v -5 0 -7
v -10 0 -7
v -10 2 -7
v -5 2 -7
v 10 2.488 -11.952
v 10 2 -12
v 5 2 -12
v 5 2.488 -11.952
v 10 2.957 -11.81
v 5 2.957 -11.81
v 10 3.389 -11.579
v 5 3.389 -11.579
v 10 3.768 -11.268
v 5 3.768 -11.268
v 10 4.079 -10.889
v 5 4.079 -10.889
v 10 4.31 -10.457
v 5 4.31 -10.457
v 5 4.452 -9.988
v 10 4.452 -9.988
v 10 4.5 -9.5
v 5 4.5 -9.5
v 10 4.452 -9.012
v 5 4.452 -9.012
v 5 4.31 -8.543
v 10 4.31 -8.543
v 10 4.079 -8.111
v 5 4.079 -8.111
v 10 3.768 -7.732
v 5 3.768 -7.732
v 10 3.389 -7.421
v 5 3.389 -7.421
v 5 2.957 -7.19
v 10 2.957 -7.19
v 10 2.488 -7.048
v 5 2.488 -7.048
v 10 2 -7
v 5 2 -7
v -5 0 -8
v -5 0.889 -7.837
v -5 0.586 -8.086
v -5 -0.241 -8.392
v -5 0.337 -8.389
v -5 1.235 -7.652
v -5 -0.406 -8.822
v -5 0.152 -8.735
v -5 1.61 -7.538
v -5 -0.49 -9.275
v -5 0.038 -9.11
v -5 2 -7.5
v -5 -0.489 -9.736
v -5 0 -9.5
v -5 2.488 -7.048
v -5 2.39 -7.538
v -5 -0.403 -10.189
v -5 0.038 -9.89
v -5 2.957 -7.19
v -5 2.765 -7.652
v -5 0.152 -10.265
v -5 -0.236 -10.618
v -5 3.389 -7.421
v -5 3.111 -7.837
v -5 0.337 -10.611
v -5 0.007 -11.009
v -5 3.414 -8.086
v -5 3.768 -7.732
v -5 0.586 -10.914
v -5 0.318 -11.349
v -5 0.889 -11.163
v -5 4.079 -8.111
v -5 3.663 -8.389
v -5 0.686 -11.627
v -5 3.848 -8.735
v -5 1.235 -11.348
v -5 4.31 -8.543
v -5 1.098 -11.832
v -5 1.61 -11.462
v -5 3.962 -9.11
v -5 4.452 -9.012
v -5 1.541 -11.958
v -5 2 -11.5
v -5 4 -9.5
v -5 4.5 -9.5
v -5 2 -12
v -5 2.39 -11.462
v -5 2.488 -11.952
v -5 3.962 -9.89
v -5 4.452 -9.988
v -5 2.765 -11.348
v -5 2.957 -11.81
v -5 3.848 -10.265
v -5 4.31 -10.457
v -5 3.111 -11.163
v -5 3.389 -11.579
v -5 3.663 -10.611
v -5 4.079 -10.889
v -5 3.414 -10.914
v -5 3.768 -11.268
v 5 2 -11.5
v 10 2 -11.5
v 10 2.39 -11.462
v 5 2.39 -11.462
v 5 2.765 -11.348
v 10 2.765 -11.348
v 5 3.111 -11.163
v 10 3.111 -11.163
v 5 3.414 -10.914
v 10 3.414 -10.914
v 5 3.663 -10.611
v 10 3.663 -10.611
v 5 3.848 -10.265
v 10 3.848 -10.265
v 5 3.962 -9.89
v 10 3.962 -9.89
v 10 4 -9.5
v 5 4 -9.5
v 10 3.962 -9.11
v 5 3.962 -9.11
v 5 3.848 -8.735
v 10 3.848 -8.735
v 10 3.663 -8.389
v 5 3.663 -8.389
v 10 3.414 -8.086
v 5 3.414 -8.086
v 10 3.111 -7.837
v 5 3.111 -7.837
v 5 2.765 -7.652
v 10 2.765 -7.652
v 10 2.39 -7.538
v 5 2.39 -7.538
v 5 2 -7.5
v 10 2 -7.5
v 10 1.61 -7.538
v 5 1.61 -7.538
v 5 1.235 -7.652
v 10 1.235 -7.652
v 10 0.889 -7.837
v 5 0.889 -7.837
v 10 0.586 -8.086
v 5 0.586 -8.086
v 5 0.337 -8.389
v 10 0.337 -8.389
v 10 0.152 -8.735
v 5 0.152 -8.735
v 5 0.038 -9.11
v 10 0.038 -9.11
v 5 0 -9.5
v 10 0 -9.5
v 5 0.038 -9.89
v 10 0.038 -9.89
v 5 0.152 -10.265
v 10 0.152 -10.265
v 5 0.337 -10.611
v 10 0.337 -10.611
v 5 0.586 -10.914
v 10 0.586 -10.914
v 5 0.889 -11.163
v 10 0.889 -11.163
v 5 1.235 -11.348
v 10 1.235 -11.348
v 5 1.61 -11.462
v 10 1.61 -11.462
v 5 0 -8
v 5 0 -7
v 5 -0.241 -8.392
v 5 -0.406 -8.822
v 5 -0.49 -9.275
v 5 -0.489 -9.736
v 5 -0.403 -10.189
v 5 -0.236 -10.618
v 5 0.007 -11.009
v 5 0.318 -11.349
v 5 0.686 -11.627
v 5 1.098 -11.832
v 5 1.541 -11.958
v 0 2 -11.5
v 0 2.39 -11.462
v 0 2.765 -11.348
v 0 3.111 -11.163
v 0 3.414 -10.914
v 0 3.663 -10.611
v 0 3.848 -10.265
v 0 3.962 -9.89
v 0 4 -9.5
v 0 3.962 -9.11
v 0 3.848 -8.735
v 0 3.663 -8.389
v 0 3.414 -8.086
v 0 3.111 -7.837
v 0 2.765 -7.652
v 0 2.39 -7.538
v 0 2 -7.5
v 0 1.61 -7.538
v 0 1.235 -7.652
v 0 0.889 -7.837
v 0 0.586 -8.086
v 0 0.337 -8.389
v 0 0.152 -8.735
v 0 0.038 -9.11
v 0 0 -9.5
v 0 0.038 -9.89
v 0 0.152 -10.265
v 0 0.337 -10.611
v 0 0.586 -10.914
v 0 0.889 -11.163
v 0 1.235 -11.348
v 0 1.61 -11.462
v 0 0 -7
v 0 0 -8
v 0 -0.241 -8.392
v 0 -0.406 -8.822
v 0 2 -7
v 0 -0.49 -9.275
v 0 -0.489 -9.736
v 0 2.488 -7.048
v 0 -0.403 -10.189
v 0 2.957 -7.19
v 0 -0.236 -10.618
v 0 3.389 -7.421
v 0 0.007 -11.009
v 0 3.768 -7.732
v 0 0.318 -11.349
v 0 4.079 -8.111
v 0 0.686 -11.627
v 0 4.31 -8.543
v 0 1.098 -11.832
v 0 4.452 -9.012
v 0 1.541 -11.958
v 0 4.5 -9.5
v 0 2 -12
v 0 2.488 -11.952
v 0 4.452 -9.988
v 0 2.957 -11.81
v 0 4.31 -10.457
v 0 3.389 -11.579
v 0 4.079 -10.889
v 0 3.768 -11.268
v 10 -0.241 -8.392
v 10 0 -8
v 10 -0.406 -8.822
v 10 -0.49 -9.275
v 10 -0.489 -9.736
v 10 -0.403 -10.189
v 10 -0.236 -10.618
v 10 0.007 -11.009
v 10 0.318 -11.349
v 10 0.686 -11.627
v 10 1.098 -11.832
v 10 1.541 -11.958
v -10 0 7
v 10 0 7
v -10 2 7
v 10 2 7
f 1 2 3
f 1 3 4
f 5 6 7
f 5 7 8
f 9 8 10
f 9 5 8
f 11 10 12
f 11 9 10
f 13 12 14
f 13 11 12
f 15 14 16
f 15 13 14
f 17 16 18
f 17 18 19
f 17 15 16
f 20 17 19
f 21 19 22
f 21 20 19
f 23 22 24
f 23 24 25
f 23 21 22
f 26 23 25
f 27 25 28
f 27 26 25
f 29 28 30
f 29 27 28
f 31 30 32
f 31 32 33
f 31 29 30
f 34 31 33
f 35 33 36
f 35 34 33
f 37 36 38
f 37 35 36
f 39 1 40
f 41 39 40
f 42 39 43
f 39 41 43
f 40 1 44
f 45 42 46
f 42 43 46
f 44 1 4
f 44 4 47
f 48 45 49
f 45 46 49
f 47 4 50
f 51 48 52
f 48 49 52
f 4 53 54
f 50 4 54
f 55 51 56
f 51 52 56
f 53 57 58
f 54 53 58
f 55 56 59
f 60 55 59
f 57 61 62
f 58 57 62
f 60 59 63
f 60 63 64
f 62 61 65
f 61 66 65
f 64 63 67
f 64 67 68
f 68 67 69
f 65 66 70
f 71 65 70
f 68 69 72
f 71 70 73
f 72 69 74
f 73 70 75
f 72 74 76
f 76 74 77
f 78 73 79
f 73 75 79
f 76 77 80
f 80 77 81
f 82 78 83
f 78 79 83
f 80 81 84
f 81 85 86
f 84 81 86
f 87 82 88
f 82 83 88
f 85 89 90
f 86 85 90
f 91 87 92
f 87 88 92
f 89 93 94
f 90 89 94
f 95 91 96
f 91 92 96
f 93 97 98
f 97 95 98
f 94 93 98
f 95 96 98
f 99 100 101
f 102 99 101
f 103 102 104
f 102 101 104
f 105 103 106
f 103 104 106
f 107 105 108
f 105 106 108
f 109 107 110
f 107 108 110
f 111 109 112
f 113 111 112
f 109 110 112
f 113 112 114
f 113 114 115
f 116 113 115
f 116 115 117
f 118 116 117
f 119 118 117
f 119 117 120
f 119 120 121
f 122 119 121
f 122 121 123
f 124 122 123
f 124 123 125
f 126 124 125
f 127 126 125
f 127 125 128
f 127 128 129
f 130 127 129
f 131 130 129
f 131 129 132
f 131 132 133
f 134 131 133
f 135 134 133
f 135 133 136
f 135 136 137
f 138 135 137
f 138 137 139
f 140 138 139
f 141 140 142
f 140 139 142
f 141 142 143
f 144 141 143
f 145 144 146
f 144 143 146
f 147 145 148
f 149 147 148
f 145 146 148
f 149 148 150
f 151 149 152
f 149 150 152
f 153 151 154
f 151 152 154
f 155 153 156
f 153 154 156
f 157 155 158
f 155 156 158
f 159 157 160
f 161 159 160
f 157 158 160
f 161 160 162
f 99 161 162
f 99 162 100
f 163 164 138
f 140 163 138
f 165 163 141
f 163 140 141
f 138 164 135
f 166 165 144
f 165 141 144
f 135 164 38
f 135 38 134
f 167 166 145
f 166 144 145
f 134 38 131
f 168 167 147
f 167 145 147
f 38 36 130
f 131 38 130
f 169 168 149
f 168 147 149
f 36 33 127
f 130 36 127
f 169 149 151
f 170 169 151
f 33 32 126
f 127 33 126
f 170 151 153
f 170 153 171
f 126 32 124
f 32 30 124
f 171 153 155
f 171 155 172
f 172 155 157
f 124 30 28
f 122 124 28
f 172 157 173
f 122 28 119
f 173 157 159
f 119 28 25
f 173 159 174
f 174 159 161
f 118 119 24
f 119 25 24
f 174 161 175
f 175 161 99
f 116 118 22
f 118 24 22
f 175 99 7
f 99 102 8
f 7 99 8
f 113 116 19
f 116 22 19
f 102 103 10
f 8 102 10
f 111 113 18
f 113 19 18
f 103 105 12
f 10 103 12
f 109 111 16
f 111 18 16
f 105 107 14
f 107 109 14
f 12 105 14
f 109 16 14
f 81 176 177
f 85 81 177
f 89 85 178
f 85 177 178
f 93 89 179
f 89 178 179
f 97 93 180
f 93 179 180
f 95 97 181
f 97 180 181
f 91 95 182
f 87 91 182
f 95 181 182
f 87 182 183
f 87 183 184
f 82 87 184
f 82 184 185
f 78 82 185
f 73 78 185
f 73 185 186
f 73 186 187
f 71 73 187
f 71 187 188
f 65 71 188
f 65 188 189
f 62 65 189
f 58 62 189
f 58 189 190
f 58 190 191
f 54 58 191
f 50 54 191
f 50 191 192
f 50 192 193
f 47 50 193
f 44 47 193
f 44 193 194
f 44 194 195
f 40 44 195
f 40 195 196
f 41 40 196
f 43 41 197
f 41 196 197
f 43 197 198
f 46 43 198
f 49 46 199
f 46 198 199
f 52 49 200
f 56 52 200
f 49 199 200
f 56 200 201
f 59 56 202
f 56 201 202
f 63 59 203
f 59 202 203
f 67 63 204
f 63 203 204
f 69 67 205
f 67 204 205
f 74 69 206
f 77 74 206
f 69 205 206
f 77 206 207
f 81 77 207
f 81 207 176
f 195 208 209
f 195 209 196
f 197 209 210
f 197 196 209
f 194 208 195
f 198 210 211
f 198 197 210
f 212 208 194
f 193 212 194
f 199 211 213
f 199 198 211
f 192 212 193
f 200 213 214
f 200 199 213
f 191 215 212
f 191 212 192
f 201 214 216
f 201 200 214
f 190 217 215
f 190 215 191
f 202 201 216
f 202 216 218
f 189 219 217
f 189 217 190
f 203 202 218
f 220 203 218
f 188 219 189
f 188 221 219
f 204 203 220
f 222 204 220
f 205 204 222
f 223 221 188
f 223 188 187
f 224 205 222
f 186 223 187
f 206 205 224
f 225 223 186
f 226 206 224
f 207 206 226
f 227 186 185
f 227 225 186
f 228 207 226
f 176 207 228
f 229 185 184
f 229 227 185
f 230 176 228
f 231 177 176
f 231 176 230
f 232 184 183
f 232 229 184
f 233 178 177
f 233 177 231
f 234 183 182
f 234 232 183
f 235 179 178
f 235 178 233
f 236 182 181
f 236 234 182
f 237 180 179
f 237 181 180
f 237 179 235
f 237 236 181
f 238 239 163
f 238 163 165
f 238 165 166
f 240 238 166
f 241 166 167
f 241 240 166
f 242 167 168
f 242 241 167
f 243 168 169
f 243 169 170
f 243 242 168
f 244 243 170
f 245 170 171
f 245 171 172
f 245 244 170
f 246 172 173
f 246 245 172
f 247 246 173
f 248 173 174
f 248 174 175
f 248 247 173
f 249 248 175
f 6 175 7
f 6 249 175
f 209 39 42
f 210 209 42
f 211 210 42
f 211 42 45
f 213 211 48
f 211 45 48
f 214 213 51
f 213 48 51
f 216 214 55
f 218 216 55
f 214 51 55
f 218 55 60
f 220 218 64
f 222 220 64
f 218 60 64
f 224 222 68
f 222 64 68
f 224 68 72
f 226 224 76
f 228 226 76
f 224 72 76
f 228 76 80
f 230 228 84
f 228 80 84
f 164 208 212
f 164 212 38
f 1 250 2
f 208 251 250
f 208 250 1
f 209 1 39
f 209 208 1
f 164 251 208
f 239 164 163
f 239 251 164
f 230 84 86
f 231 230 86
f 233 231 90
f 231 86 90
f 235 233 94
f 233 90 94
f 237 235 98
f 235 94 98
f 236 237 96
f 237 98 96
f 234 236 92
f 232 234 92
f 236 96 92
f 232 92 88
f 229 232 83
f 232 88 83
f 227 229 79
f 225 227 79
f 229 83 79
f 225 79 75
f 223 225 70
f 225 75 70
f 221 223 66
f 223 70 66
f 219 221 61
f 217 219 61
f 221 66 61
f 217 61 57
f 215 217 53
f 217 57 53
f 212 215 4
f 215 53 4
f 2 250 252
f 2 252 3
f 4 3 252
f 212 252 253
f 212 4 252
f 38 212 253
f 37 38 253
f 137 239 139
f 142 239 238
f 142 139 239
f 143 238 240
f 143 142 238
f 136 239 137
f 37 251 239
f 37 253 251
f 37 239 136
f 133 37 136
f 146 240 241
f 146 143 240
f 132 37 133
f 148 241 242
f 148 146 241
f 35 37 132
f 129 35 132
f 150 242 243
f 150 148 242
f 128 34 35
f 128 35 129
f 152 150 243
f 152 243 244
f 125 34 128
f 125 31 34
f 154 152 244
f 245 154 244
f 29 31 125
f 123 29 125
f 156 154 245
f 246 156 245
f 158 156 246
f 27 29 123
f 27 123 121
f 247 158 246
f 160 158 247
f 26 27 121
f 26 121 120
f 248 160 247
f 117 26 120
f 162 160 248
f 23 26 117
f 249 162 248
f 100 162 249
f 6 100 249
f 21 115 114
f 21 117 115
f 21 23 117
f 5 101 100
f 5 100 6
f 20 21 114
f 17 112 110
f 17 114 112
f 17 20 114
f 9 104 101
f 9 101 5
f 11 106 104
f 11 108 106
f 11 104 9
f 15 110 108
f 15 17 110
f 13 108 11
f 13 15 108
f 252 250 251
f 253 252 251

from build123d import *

# Parameters (mm, degrees)
SKETCH2_W           = 20
SKETCH2_H           = 14
BOSS_EXTRUDE2_DEPTH = 2
BOSS_EXTRUDE3_DEPTH = 5
SKETCH4_R           = 2
CUT_EXTRUDE1_DEPTH  = 21


with BuildPart() as part:
    # Sketch2 → Boss-Extrude2 (new body)
    with BuildSketch(Plane(origin=(0, 0, 0), x_dir=(1, 0, 0), z_dir=(0, 1, 0))):
        Rectangle(SKETCH2_W, SKETCH2_H)
    extrude(amount=BOSS_EXTRUDE2_DEPTH)

    # Sketch3 → Boss-Extrude3 (add)
    with BuildSketch(Plane(origin=(10, 0, 0), x_dir=(0, 0, -1), z_dir=(1, 0, 0))):
        with BuildLine():
            Line((12, 2), (7, 2))
            Line((7, 2), (7, 0))
            Line((7, 0), (8, 0))
            ThreePointArc((8, 0), (10.618033989, -0.236067977), (12, 2))
        make_face()
        with BuildLine():
            ThreePointArc((12, 2), (9.5, 4.5), (7, 2))
            Line((7, 2), (12, 2))
        make_face()
    boss_extrude3 = extrude(amount=-BOSS_EXTRUDE3_DEPTH)

    # Mirror1: Boss-Extrude3 across plane
    add(boss_extrude3.mirror(Plane.ZY.offset(-2.5)))

    # Sketch4 → Cut-Extrude1 (cut, through all)
    with BuildSketch(Plane(origin=(10, 0, 0), x_dir=(0, 0, -1), z_dir=(1, 0, 0))):
        with Locations((9.5, 2)):
            Circle(SKETCH4_R)
    extrude(amount=-CUT_EXTRUDE1_DEPTH, mode=Mode.SUBTRACT)


solid = part.part
